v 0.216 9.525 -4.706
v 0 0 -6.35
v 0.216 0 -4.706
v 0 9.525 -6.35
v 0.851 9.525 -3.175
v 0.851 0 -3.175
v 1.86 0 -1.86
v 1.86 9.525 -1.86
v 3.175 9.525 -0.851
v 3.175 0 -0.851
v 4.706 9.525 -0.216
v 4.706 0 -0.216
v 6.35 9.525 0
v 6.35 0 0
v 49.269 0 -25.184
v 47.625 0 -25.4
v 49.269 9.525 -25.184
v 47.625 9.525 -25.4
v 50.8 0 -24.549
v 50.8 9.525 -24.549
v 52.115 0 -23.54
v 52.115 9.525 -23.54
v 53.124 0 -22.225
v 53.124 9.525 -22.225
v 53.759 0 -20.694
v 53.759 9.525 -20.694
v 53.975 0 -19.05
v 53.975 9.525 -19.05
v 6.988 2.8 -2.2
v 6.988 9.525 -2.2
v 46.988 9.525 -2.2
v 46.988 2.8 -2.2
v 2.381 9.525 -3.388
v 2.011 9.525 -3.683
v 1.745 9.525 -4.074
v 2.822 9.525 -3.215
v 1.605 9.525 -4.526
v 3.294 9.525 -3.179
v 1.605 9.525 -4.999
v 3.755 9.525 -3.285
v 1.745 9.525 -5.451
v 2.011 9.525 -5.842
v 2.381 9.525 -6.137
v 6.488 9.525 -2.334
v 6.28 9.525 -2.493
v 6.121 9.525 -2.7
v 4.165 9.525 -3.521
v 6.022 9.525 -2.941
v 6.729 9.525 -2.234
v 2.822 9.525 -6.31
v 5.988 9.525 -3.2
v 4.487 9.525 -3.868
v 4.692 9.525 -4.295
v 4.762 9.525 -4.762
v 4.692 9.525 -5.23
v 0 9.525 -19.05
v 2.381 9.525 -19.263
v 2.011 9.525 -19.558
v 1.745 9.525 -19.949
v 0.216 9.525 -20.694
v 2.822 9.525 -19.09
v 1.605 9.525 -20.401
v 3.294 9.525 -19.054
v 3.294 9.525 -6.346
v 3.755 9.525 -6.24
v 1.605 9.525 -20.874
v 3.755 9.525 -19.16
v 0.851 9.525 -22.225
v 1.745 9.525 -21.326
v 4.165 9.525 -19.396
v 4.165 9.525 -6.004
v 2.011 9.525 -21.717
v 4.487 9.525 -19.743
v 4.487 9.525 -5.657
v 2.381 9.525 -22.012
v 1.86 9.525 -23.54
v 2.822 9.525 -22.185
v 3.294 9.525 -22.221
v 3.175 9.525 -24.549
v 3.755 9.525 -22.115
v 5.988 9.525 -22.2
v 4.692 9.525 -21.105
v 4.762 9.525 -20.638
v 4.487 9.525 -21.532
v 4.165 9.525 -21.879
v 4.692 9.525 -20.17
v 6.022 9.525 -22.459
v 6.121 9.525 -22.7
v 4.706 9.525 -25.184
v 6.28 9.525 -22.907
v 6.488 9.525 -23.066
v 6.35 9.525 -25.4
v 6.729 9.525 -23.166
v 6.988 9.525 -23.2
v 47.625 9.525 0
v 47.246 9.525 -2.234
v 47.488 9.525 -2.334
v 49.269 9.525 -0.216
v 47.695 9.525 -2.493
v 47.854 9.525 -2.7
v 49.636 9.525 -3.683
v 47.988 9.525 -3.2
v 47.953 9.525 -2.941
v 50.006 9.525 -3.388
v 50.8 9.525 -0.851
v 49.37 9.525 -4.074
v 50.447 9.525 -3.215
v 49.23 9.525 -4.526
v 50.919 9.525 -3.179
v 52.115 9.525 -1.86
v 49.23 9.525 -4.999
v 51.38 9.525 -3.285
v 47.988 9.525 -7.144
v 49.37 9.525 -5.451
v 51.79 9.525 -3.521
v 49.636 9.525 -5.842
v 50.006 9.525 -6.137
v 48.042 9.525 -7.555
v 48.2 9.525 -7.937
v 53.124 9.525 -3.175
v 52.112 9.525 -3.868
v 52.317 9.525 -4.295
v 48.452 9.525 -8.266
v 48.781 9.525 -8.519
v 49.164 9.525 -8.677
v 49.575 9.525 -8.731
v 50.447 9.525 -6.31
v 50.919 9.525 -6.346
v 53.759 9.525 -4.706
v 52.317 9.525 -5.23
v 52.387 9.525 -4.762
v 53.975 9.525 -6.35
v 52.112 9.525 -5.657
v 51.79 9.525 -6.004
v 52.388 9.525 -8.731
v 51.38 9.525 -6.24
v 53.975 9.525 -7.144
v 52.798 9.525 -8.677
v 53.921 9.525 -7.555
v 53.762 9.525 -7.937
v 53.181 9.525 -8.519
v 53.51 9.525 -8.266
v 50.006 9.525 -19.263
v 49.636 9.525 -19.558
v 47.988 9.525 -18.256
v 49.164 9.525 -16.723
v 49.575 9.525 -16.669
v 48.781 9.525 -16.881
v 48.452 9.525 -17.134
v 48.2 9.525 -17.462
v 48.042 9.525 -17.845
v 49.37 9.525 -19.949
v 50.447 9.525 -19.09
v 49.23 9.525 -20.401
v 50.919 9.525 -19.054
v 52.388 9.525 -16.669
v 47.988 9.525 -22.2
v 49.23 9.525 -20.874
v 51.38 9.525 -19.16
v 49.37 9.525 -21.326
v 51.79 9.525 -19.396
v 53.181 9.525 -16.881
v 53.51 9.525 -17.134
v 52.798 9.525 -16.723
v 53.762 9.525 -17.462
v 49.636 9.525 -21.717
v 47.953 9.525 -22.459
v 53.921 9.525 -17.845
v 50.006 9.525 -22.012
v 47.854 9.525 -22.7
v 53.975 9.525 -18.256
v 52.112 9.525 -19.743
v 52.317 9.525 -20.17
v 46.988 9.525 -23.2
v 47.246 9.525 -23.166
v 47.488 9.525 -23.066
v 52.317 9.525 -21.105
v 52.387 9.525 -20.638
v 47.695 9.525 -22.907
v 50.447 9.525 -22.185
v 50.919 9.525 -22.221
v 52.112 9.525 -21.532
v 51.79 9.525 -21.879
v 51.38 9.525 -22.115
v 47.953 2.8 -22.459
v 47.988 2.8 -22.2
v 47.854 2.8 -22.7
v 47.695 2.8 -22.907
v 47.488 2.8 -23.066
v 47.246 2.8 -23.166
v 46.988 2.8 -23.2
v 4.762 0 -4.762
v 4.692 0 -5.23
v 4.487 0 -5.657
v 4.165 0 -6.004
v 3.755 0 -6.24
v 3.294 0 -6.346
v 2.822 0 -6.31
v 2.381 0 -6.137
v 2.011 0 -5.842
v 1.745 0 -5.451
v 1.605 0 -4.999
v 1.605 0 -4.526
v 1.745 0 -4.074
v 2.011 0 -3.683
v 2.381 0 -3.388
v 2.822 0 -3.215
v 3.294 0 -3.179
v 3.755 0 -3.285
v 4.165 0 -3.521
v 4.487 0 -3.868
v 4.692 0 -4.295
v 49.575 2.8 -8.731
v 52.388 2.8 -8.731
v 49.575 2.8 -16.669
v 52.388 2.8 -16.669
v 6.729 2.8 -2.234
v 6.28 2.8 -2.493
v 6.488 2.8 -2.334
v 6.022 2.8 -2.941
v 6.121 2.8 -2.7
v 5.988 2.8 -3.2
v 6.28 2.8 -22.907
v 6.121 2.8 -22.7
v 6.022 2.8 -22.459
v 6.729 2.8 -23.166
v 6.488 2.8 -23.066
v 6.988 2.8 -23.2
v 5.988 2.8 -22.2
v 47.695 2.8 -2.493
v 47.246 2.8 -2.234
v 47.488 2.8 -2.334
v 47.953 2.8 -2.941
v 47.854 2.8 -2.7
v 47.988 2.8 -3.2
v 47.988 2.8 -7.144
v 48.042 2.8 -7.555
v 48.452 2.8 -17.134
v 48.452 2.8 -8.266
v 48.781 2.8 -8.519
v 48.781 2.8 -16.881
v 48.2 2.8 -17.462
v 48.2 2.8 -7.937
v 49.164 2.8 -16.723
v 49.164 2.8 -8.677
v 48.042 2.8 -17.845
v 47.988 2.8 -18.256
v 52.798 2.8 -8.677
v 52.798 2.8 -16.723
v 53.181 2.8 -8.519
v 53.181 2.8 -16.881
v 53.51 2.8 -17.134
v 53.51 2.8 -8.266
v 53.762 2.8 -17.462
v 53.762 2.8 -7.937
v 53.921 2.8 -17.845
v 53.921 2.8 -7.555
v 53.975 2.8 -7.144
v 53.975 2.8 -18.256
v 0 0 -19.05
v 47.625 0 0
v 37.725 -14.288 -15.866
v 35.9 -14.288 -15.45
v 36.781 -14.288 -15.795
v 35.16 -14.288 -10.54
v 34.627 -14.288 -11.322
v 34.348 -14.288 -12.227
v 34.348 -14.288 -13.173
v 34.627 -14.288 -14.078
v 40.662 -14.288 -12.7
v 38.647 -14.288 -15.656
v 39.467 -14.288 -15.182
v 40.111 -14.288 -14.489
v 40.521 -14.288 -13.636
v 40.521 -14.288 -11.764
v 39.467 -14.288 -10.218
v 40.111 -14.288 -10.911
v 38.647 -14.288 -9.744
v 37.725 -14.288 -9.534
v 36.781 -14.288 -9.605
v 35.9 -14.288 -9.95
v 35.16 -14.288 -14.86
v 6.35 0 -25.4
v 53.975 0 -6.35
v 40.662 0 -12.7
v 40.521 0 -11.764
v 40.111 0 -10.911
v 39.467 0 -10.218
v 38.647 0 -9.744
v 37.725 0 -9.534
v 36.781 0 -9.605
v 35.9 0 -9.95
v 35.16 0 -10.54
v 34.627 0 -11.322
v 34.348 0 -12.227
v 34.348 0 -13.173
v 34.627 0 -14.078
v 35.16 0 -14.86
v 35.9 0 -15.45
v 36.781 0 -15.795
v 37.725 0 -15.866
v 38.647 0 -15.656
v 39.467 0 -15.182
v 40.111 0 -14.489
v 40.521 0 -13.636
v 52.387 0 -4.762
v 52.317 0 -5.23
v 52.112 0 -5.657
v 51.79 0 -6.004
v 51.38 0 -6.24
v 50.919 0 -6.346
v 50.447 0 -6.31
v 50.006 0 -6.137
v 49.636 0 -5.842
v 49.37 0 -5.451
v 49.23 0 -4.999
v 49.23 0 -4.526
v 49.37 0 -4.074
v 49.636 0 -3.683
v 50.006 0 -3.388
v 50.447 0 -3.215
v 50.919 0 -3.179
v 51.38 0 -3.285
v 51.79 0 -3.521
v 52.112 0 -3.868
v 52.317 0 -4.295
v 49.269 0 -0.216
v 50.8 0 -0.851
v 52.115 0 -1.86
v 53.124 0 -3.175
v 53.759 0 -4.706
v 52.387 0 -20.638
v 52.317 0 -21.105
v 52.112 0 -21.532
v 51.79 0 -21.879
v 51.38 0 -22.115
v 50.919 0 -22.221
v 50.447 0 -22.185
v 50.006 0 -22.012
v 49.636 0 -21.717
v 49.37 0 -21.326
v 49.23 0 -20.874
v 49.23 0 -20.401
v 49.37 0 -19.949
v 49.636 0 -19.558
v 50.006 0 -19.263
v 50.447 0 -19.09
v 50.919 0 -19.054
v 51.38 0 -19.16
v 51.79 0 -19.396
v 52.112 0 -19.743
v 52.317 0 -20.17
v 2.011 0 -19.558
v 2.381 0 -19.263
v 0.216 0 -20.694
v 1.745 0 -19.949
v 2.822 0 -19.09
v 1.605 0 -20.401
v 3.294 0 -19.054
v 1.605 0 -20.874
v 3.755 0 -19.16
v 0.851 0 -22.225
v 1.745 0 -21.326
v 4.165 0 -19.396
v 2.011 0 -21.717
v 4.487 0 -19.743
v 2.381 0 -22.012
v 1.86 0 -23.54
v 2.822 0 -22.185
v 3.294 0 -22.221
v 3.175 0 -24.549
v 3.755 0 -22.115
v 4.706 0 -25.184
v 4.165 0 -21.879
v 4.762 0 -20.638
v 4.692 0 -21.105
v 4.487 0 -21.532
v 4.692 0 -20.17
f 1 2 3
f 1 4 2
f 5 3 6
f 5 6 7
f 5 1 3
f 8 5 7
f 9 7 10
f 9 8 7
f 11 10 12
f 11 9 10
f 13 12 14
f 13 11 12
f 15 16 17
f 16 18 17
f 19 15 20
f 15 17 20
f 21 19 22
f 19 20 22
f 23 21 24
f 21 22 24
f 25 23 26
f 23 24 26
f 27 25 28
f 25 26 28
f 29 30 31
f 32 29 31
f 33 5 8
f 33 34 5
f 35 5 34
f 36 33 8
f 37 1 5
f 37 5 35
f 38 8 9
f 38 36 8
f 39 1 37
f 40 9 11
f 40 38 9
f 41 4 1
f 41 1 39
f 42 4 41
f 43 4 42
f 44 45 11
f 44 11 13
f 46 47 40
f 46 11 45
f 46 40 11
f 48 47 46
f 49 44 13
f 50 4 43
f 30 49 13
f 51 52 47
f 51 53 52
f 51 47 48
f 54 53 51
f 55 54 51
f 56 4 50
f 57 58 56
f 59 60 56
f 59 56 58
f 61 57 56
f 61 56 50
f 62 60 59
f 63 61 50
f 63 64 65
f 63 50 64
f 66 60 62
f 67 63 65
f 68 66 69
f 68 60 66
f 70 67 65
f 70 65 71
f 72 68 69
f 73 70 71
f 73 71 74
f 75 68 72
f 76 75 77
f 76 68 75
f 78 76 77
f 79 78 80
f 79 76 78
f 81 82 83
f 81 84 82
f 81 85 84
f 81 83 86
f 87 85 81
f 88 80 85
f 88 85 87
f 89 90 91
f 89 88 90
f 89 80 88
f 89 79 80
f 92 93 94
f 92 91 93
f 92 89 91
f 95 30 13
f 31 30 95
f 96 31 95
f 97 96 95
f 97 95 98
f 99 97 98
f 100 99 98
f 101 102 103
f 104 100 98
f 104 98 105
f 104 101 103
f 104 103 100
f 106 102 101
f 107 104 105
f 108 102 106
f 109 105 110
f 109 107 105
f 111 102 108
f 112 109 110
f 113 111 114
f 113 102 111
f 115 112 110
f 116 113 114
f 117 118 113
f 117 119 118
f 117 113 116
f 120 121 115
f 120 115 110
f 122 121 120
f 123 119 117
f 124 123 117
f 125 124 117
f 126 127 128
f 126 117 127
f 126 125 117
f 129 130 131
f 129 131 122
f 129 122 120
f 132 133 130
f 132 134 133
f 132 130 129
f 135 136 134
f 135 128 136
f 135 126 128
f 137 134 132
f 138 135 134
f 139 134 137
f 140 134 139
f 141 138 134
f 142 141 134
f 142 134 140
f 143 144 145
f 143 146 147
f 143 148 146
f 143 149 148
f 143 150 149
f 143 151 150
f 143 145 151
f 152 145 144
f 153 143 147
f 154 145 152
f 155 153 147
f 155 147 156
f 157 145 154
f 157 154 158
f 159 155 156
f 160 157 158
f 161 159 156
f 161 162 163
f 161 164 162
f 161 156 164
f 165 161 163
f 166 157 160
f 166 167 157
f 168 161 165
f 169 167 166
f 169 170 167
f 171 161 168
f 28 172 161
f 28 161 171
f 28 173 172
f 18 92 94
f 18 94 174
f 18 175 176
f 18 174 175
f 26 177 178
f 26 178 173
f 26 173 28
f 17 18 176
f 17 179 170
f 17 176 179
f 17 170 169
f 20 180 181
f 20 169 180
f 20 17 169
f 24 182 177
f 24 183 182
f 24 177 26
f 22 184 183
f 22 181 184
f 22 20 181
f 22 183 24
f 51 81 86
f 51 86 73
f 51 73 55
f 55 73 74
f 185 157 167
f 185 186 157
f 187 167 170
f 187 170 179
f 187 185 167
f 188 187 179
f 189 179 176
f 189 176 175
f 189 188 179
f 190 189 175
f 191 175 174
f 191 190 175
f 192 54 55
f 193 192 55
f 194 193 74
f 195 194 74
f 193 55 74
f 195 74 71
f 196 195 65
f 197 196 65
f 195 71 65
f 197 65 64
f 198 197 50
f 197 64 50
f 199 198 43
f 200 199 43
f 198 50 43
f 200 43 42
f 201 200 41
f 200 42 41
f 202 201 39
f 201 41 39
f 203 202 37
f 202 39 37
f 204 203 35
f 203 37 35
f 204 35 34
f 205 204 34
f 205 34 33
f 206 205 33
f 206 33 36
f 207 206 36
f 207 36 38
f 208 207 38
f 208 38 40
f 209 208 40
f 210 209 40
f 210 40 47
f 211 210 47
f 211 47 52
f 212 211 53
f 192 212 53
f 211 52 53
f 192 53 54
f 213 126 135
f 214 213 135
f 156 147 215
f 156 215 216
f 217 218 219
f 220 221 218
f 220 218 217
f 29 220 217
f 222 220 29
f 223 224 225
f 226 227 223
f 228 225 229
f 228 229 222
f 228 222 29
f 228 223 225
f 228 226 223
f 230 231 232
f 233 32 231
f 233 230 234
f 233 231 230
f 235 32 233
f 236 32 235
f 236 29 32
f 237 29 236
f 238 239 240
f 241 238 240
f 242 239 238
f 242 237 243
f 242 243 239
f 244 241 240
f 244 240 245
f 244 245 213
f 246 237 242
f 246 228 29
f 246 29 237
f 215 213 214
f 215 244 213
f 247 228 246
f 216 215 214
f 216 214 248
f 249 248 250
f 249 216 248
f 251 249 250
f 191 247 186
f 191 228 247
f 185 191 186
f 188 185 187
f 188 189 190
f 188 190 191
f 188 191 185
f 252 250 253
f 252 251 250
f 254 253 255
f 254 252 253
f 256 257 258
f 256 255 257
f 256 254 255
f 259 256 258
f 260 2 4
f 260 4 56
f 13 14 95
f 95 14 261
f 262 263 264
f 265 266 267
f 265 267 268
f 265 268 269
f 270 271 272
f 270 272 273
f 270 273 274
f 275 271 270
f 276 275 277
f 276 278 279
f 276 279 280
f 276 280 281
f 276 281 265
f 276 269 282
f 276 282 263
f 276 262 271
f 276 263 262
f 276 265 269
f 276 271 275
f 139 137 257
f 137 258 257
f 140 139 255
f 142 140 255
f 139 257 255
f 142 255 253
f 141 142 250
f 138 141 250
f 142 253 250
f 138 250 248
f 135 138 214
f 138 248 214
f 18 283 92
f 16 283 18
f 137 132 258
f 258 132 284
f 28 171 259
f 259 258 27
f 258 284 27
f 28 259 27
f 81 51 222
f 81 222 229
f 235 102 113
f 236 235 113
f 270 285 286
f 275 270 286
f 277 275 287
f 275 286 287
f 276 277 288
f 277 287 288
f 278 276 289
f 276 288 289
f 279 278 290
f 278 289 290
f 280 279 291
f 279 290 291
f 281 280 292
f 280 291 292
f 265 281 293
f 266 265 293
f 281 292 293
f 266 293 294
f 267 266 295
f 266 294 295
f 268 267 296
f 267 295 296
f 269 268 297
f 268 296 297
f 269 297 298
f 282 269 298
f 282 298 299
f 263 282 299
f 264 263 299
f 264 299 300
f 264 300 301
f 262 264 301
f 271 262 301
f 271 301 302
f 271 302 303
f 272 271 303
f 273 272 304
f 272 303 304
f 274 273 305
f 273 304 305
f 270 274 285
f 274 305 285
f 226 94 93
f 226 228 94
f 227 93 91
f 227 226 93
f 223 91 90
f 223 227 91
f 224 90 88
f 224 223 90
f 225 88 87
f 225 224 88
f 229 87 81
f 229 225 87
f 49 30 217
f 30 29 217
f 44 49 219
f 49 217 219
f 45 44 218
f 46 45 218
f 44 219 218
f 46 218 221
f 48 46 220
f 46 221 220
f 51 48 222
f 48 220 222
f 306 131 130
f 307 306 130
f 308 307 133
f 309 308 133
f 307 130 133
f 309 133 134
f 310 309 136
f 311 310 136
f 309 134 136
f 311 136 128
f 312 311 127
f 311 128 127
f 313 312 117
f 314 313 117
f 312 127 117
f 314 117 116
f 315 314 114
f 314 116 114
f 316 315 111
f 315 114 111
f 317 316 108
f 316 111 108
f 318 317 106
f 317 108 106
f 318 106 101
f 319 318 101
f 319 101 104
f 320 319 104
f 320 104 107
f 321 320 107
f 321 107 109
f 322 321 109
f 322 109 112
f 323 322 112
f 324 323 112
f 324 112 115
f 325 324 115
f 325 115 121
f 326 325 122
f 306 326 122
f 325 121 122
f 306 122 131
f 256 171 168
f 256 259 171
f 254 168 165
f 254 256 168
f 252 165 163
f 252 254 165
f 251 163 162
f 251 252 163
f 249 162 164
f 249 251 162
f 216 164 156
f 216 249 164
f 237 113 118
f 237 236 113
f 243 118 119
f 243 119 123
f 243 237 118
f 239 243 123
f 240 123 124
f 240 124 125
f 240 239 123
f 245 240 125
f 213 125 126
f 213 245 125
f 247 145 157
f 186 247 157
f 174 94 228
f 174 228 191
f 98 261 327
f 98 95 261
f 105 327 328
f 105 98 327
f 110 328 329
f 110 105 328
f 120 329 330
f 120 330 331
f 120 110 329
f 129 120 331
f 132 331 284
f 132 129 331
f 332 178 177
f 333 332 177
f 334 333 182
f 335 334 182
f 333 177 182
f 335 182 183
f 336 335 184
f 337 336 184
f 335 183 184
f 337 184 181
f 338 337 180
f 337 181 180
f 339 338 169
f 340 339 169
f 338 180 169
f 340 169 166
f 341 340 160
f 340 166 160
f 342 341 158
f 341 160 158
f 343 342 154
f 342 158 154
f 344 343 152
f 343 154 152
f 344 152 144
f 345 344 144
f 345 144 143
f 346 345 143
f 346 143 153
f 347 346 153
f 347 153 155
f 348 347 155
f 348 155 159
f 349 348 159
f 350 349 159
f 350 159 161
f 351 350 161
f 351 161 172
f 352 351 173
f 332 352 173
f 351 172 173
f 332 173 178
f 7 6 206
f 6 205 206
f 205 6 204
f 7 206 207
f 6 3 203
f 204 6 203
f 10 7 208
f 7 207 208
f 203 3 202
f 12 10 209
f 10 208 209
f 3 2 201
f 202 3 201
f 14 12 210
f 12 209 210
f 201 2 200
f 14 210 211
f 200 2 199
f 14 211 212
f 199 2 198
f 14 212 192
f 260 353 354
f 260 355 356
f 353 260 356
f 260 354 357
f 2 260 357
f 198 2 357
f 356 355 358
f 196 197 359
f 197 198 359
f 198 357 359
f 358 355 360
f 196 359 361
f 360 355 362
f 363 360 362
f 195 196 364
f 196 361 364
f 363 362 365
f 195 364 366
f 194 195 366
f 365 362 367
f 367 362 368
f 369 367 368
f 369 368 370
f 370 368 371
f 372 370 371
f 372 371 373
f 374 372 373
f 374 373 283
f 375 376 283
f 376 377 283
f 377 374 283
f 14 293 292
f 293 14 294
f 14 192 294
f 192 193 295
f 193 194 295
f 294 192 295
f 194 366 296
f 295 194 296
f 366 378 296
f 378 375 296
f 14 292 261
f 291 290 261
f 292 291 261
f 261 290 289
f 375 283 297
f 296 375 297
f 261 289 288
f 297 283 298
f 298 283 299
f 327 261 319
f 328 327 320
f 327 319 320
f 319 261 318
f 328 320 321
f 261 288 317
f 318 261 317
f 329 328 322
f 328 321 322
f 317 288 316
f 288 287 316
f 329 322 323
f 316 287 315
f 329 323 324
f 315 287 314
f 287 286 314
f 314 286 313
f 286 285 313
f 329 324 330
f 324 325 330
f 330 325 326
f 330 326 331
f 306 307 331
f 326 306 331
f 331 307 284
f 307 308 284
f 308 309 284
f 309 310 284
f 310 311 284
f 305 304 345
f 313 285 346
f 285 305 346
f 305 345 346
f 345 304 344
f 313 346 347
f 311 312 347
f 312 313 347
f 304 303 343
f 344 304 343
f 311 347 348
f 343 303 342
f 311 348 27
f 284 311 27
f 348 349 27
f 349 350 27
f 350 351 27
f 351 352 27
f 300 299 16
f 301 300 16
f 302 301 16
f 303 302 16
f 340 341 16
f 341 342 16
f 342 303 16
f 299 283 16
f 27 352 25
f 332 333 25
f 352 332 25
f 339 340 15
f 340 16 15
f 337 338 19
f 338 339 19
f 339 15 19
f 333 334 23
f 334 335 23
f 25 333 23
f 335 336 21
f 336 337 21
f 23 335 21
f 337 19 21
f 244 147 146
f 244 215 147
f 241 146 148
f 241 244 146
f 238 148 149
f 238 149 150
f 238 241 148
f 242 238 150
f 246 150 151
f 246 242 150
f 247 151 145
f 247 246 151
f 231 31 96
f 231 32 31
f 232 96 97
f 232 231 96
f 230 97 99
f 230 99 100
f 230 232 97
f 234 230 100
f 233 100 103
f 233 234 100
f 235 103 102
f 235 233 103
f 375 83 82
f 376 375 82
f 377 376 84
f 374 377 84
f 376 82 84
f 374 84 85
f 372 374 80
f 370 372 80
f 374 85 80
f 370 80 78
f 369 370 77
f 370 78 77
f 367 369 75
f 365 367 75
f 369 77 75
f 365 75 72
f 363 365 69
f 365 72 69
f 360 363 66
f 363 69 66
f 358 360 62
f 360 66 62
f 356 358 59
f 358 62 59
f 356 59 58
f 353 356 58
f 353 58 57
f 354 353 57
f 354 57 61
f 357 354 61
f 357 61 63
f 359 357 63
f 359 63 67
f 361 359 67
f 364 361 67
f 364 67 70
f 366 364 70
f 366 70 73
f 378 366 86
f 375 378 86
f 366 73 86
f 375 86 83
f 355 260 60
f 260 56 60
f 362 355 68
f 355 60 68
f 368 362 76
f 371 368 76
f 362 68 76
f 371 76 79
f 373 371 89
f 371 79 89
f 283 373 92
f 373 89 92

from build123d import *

# Parameters (mm, degrees)
SKETCH1_W           = 53.975
SKETCH1_H           = 25.4
BOSS_EXTRUDE1_DEPTH = 9.525
SKETCH2_W           = 42
SKETCH2_H           = 21
CUT_EXTRUDE1_DEPTH  = 6.725
FILLET1_R           = 1
SKETCH3_R           = 3.175
BOSS_EXTRUDE2_DEPTH = 14.2875
SKETCH4_R           = 1.5875
CUT_EXTRUDE2_DEPTH  = 9.525
FILLET2_R           = 6.35
SKETCH5_W           = 5.9875
SKETCH5_H           = 7.9375
CUT_EXTRUDE3_DEPTH  = 6.725
FILLET3_R           = 1.5875


with BuildPart() as part:
    # Sketch1 → Boss-Extrude1 (new body)
    with BuildSketch(Plane(origin=(0, 0, 0), x_dir=(1, 0, 0), z_dir=(0, 1, 0))):
        with Locations((26.9875, 12.7)):
            Rectangle(SKETCH1_W, SKETCH1_H)
    extrude(amount=BOSS_EXTRUDE1_DEPTH)

    # Sketch2 → Cut-Extrude1 (cut)
    with BuildSketch(Plane(origin=(0, 9.525, 0), x_dir=(1, 0, 0), z_dir=(0, 1, 0))):
        with Locations((26.9875, 12.7)):
            Rectangle(SKETCH2_W, SKETCH2_H)
    extrude(amount=-CUT_EXTRUDE1_DEPTH, mode=Mode.SUBTRACT)

    # Fillet1
    fillet1_edges = [part.edges().sort_by_distance(p)[0] for p in [
        (5.9875, 6.1625, -2.2),
        (5.9875, 6.1625, -23.2),
        (47.9875, 6.1625, -23.2),
        (47.9875, 6.1625, -2.2),
    ]]
    fillet(fillet1_edges, radius=FILLET1_R)

    # Sketch3 → Boss-Extrude2 (add)
    with BuildSketch(Plane.XZ):
        with Locations((37.4875, -12.7)):
            Circle(SKETCH3_R)
    extrude(amount=BOSS_EXTRUDE2_DEPTH)

    # Sketch4 → Cut-Extrude2 (cut)
    with BuildSketch(Plane(origin=(0, 9.525, 0), x_dir=(1, 0, 0), z_dir=(0, 1, 0))):
        with Locations((3.175, 20.6375)):
            Circle(SKETCH4_R)
        with Locations((3.175, 4.7625)):
            Circle(SKETCH4_R)
        with Locations((50.8, 20.6375)):
            Circle(SKETCH4_R)
        with Locations((50.8, 4.7625)):
            Circle(SKETCH4_R)
    extrude(amount=-CUT_EXTRUDE2_DEPTH, mode=Mode.SUBTRACT)

    # Fillet2
    fillet2_edges = [part.edges().sort_by_distance(p)[0] for p in [
        (0, 4.7625, -25.4),
        (53.975, 4.7625, -25.4),
        (53.975, 4.7625, 0),
        (0, 4.7625, 0),
    ]]
    fillet(fillet2_edges, radius=FILLET2_R)

    # Sketch5 → Cut-Extrude3 (cut)
    with BuildSketch(Plane(origin=(0, 9.525, 0), x_dir=(1, 0, 0), z_dir=(0, 1, 0))):
        with Locations((50.98125, 12.7)):
            Rectangle(SKETCH5_W, SKETCH5_H)
    extrude(amount=-CUT_EXTRUDE3_DEPTH, mode=Mode.SUBTRACT)

    # Fillet3
    fillet3_edges = [part.edges().sort_by_distance(p)[0] for p in [
        (53.975, 6.1625, -8.73125),
        (47.9875, 6.1625, -8.73125),
        (47.9875, 6.1625, -16.66875),
        (53.975, 6.1625, -16.66875),
    ]]
    fillet(fillet3_edges, radius=FILLET3_R)


solid = part.part
